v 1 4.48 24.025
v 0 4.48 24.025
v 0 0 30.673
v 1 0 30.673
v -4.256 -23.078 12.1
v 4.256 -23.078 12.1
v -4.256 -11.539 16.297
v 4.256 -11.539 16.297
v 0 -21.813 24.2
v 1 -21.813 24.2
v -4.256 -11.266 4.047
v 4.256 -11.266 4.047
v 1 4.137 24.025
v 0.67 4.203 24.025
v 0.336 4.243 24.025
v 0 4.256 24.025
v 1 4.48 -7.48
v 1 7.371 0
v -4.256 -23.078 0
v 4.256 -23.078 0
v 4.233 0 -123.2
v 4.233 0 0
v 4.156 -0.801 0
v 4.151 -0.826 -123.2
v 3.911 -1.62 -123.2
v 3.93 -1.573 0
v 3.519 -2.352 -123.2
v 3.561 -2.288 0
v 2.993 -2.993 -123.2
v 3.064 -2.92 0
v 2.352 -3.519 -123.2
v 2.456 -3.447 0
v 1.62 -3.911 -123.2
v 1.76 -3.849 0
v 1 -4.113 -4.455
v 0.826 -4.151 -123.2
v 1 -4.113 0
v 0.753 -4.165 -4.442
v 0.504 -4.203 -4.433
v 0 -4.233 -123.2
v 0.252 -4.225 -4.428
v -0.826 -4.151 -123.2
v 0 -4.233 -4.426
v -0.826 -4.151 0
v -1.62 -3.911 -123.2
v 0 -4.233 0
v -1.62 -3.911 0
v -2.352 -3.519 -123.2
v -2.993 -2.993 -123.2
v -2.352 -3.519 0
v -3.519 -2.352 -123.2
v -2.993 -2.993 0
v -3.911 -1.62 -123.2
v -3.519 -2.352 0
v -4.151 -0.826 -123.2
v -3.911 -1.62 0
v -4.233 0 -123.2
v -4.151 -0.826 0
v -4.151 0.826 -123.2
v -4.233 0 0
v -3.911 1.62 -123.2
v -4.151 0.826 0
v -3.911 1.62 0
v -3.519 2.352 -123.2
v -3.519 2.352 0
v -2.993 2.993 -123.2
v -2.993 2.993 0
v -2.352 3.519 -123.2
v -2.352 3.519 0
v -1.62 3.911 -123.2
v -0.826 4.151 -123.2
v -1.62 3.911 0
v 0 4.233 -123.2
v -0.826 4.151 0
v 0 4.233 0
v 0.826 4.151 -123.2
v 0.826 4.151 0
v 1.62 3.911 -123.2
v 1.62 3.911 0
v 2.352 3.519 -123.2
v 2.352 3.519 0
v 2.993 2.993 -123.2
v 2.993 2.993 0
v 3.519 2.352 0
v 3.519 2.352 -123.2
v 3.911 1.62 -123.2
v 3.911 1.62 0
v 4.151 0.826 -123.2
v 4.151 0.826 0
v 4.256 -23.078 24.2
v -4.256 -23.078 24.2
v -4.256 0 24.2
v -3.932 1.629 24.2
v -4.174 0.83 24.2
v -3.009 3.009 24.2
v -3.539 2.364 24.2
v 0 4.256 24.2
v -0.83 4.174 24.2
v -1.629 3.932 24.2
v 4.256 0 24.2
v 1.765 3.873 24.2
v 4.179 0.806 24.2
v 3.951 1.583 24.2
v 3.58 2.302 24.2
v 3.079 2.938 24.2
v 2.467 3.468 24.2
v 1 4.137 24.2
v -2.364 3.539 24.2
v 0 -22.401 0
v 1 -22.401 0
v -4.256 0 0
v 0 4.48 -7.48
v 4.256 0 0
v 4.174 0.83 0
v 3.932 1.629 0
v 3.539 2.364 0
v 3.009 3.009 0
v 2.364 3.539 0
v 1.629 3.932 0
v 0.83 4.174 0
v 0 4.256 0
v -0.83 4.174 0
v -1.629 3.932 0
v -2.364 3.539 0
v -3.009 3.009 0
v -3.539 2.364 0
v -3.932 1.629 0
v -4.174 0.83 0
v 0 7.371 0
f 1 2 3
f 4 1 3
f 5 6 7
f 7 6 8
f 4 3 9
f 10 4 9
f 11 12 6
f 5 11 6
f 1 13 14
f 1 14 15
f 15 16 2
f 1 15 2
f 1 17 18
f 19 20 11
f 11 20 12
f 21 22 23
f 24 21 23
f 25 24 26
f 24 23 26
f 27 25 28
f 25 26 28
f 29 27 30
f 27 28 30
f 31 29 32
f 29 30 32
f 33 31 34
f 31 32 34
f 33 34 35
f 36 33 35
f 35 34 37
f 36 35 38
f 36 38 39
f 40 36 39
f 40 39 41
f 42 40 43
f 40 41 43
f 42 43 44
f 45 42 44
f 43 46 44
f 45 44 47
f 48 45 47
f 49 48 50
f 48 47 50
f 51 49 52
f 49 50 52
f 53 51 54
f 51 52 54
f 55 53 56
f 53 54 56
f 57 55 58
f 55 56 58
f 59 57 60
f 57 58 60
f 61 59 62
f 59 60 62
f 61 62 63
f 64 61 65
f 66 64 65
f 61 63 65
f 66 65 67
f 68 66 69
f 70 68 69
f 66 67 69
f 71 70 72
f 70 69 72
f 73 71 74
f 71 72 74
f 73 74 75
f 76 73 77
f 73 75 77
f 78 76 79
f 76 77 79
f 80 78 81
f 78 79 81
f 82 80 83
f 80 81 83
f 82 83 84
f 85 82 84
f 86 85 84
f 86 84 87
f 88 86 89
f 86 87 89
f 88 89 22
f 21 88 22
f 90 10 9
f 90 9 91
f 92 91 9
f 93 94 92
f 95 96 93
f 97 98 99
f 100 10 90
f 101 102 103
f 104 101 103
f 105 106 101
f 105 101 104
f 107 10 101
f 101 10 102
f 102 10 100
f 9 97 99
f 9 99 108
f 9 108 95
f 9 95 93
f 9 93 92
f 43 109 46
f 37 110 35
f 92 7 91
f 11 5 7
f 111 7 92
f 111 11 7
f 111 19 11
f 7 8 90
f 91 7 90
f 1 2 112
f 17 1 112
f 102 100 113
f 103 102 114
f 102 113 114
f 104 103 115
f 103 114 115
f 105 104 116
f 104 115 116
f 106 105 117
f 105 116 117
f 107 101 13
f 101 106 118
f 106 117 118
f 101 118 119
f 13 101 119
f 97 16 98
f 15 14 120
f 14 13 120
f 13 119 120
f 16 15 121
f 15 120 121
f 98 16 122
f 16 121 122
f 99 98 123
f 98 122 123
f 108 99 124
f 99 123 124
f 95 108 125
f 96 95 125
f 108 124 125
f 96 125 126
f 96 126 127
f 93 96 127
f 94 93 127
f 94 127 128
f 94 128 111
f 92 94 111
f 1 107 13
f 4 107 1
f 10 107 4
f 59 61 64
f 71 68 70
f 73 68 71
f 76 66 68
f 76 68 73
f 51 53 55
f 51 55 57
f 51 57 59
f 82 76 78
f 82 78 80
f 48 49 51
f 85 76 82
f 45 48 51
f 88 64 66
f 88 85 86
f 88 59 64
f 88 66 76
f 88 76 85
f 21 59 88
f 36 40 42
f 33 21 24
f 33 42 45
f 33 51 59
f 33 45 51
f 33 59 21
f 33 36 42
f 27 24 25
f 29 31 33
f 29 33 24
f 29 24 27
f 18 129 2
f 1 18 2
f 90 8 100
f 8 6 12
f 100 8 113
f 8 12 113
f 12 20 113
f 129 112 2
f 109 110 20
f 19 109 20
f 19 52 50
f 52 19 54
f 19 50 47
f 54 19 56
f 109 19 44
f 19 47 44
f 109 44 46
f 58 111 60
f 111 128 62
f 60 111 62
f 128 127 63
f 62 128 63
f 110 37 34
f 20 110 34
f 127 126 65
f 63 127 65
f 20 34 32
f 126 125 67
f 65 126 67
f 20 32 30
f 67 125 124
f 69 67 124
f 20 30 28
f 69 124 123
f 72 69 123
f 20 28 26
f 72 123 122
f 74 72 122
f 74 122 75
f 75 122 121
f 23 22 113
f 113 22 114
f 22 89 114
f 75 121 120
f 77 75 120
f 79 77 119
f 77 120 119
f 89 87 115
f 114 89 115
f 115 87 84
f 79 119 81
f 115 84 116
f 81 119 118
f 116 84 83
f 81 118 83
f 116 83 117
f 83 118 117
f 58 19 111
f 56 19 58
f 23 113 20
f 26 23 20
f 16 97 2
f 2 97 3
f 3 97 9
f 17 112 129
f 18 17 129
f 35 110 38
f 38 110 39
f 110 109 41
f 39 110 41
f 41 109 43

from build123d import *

# Parameters (mm, degrees)
F0_W     = 8.511868917
F0_H     = 23.0781268328
F1_DEPTH = 24.2
F3_DEPTH = 25
F4_R     = 4.2327268103
F5_DEPTH = 123.2
F7_DEPTH = 1


with BuildPart() as f1:
    # F0 (on Top) → F1 (new body)
    with BuildSketch(Plane.XY):
        with Locations((0, -11.5390634164)):
            Rectangle(F0_W, F0_H)
        with BuildLine():
            Line((-4.2559344585, 0), (4.2559344585, 0))
            ThreePointArc((4.2559344585, 0), (0, 4.2559344585), (-4.2559344585, 0))
        make_face()
    extrude(amount=F1_DEPTH)

    # F2 (on face) → F3 (cut)
    with BuildSketch(Plane.YZ.offset(4.2559344585)):
        Polygon((-11.5390634164, 16.2968765944), (-23.0781268328, 24.2), (-23.0781268328, 12.1), align=None)
        Polygon((-11.2656261772, 4.0468750522), (-23.0781268328, 12.1), (-23.0781268328, 0), align=None)
    extrude(amount=-F3_DEPTH, mode=Mode.SUBTRACT)

    # F4 (on face) → F5 (join)
    with BuildSketch(Plane(origin=(0, 0, 0), x_dir=(1, 0, 0), z_dir=(0, 0, -1))):
        Circle(F4_R)
    extrude(amount=F5_DEPTH)

    # F6 (on Right) → F7 (join)
    with BuildSketch(Plane.YZ):
        Polygon((0, 30.673397705), (-22.4007293582, 24.0254402161), (4.4801449403, 24.0254402161), align=None)
        Polygon((0, 0), (-22.4007293582, 0), (0, -5.4568112828), align=None)
    extrude(amount=F7_DEPTH)

    # F6 (on Right) → F7, piece 2 (join)
    with BuildSketch(Plane.YZ):
        Polygon((7.370563224, 0), (4.4801449403, 24.0254402161), (4.4801449403, -7.4801021256), align=None)
    extrude(amount=F7_DEPTH)


solid = f1.part
